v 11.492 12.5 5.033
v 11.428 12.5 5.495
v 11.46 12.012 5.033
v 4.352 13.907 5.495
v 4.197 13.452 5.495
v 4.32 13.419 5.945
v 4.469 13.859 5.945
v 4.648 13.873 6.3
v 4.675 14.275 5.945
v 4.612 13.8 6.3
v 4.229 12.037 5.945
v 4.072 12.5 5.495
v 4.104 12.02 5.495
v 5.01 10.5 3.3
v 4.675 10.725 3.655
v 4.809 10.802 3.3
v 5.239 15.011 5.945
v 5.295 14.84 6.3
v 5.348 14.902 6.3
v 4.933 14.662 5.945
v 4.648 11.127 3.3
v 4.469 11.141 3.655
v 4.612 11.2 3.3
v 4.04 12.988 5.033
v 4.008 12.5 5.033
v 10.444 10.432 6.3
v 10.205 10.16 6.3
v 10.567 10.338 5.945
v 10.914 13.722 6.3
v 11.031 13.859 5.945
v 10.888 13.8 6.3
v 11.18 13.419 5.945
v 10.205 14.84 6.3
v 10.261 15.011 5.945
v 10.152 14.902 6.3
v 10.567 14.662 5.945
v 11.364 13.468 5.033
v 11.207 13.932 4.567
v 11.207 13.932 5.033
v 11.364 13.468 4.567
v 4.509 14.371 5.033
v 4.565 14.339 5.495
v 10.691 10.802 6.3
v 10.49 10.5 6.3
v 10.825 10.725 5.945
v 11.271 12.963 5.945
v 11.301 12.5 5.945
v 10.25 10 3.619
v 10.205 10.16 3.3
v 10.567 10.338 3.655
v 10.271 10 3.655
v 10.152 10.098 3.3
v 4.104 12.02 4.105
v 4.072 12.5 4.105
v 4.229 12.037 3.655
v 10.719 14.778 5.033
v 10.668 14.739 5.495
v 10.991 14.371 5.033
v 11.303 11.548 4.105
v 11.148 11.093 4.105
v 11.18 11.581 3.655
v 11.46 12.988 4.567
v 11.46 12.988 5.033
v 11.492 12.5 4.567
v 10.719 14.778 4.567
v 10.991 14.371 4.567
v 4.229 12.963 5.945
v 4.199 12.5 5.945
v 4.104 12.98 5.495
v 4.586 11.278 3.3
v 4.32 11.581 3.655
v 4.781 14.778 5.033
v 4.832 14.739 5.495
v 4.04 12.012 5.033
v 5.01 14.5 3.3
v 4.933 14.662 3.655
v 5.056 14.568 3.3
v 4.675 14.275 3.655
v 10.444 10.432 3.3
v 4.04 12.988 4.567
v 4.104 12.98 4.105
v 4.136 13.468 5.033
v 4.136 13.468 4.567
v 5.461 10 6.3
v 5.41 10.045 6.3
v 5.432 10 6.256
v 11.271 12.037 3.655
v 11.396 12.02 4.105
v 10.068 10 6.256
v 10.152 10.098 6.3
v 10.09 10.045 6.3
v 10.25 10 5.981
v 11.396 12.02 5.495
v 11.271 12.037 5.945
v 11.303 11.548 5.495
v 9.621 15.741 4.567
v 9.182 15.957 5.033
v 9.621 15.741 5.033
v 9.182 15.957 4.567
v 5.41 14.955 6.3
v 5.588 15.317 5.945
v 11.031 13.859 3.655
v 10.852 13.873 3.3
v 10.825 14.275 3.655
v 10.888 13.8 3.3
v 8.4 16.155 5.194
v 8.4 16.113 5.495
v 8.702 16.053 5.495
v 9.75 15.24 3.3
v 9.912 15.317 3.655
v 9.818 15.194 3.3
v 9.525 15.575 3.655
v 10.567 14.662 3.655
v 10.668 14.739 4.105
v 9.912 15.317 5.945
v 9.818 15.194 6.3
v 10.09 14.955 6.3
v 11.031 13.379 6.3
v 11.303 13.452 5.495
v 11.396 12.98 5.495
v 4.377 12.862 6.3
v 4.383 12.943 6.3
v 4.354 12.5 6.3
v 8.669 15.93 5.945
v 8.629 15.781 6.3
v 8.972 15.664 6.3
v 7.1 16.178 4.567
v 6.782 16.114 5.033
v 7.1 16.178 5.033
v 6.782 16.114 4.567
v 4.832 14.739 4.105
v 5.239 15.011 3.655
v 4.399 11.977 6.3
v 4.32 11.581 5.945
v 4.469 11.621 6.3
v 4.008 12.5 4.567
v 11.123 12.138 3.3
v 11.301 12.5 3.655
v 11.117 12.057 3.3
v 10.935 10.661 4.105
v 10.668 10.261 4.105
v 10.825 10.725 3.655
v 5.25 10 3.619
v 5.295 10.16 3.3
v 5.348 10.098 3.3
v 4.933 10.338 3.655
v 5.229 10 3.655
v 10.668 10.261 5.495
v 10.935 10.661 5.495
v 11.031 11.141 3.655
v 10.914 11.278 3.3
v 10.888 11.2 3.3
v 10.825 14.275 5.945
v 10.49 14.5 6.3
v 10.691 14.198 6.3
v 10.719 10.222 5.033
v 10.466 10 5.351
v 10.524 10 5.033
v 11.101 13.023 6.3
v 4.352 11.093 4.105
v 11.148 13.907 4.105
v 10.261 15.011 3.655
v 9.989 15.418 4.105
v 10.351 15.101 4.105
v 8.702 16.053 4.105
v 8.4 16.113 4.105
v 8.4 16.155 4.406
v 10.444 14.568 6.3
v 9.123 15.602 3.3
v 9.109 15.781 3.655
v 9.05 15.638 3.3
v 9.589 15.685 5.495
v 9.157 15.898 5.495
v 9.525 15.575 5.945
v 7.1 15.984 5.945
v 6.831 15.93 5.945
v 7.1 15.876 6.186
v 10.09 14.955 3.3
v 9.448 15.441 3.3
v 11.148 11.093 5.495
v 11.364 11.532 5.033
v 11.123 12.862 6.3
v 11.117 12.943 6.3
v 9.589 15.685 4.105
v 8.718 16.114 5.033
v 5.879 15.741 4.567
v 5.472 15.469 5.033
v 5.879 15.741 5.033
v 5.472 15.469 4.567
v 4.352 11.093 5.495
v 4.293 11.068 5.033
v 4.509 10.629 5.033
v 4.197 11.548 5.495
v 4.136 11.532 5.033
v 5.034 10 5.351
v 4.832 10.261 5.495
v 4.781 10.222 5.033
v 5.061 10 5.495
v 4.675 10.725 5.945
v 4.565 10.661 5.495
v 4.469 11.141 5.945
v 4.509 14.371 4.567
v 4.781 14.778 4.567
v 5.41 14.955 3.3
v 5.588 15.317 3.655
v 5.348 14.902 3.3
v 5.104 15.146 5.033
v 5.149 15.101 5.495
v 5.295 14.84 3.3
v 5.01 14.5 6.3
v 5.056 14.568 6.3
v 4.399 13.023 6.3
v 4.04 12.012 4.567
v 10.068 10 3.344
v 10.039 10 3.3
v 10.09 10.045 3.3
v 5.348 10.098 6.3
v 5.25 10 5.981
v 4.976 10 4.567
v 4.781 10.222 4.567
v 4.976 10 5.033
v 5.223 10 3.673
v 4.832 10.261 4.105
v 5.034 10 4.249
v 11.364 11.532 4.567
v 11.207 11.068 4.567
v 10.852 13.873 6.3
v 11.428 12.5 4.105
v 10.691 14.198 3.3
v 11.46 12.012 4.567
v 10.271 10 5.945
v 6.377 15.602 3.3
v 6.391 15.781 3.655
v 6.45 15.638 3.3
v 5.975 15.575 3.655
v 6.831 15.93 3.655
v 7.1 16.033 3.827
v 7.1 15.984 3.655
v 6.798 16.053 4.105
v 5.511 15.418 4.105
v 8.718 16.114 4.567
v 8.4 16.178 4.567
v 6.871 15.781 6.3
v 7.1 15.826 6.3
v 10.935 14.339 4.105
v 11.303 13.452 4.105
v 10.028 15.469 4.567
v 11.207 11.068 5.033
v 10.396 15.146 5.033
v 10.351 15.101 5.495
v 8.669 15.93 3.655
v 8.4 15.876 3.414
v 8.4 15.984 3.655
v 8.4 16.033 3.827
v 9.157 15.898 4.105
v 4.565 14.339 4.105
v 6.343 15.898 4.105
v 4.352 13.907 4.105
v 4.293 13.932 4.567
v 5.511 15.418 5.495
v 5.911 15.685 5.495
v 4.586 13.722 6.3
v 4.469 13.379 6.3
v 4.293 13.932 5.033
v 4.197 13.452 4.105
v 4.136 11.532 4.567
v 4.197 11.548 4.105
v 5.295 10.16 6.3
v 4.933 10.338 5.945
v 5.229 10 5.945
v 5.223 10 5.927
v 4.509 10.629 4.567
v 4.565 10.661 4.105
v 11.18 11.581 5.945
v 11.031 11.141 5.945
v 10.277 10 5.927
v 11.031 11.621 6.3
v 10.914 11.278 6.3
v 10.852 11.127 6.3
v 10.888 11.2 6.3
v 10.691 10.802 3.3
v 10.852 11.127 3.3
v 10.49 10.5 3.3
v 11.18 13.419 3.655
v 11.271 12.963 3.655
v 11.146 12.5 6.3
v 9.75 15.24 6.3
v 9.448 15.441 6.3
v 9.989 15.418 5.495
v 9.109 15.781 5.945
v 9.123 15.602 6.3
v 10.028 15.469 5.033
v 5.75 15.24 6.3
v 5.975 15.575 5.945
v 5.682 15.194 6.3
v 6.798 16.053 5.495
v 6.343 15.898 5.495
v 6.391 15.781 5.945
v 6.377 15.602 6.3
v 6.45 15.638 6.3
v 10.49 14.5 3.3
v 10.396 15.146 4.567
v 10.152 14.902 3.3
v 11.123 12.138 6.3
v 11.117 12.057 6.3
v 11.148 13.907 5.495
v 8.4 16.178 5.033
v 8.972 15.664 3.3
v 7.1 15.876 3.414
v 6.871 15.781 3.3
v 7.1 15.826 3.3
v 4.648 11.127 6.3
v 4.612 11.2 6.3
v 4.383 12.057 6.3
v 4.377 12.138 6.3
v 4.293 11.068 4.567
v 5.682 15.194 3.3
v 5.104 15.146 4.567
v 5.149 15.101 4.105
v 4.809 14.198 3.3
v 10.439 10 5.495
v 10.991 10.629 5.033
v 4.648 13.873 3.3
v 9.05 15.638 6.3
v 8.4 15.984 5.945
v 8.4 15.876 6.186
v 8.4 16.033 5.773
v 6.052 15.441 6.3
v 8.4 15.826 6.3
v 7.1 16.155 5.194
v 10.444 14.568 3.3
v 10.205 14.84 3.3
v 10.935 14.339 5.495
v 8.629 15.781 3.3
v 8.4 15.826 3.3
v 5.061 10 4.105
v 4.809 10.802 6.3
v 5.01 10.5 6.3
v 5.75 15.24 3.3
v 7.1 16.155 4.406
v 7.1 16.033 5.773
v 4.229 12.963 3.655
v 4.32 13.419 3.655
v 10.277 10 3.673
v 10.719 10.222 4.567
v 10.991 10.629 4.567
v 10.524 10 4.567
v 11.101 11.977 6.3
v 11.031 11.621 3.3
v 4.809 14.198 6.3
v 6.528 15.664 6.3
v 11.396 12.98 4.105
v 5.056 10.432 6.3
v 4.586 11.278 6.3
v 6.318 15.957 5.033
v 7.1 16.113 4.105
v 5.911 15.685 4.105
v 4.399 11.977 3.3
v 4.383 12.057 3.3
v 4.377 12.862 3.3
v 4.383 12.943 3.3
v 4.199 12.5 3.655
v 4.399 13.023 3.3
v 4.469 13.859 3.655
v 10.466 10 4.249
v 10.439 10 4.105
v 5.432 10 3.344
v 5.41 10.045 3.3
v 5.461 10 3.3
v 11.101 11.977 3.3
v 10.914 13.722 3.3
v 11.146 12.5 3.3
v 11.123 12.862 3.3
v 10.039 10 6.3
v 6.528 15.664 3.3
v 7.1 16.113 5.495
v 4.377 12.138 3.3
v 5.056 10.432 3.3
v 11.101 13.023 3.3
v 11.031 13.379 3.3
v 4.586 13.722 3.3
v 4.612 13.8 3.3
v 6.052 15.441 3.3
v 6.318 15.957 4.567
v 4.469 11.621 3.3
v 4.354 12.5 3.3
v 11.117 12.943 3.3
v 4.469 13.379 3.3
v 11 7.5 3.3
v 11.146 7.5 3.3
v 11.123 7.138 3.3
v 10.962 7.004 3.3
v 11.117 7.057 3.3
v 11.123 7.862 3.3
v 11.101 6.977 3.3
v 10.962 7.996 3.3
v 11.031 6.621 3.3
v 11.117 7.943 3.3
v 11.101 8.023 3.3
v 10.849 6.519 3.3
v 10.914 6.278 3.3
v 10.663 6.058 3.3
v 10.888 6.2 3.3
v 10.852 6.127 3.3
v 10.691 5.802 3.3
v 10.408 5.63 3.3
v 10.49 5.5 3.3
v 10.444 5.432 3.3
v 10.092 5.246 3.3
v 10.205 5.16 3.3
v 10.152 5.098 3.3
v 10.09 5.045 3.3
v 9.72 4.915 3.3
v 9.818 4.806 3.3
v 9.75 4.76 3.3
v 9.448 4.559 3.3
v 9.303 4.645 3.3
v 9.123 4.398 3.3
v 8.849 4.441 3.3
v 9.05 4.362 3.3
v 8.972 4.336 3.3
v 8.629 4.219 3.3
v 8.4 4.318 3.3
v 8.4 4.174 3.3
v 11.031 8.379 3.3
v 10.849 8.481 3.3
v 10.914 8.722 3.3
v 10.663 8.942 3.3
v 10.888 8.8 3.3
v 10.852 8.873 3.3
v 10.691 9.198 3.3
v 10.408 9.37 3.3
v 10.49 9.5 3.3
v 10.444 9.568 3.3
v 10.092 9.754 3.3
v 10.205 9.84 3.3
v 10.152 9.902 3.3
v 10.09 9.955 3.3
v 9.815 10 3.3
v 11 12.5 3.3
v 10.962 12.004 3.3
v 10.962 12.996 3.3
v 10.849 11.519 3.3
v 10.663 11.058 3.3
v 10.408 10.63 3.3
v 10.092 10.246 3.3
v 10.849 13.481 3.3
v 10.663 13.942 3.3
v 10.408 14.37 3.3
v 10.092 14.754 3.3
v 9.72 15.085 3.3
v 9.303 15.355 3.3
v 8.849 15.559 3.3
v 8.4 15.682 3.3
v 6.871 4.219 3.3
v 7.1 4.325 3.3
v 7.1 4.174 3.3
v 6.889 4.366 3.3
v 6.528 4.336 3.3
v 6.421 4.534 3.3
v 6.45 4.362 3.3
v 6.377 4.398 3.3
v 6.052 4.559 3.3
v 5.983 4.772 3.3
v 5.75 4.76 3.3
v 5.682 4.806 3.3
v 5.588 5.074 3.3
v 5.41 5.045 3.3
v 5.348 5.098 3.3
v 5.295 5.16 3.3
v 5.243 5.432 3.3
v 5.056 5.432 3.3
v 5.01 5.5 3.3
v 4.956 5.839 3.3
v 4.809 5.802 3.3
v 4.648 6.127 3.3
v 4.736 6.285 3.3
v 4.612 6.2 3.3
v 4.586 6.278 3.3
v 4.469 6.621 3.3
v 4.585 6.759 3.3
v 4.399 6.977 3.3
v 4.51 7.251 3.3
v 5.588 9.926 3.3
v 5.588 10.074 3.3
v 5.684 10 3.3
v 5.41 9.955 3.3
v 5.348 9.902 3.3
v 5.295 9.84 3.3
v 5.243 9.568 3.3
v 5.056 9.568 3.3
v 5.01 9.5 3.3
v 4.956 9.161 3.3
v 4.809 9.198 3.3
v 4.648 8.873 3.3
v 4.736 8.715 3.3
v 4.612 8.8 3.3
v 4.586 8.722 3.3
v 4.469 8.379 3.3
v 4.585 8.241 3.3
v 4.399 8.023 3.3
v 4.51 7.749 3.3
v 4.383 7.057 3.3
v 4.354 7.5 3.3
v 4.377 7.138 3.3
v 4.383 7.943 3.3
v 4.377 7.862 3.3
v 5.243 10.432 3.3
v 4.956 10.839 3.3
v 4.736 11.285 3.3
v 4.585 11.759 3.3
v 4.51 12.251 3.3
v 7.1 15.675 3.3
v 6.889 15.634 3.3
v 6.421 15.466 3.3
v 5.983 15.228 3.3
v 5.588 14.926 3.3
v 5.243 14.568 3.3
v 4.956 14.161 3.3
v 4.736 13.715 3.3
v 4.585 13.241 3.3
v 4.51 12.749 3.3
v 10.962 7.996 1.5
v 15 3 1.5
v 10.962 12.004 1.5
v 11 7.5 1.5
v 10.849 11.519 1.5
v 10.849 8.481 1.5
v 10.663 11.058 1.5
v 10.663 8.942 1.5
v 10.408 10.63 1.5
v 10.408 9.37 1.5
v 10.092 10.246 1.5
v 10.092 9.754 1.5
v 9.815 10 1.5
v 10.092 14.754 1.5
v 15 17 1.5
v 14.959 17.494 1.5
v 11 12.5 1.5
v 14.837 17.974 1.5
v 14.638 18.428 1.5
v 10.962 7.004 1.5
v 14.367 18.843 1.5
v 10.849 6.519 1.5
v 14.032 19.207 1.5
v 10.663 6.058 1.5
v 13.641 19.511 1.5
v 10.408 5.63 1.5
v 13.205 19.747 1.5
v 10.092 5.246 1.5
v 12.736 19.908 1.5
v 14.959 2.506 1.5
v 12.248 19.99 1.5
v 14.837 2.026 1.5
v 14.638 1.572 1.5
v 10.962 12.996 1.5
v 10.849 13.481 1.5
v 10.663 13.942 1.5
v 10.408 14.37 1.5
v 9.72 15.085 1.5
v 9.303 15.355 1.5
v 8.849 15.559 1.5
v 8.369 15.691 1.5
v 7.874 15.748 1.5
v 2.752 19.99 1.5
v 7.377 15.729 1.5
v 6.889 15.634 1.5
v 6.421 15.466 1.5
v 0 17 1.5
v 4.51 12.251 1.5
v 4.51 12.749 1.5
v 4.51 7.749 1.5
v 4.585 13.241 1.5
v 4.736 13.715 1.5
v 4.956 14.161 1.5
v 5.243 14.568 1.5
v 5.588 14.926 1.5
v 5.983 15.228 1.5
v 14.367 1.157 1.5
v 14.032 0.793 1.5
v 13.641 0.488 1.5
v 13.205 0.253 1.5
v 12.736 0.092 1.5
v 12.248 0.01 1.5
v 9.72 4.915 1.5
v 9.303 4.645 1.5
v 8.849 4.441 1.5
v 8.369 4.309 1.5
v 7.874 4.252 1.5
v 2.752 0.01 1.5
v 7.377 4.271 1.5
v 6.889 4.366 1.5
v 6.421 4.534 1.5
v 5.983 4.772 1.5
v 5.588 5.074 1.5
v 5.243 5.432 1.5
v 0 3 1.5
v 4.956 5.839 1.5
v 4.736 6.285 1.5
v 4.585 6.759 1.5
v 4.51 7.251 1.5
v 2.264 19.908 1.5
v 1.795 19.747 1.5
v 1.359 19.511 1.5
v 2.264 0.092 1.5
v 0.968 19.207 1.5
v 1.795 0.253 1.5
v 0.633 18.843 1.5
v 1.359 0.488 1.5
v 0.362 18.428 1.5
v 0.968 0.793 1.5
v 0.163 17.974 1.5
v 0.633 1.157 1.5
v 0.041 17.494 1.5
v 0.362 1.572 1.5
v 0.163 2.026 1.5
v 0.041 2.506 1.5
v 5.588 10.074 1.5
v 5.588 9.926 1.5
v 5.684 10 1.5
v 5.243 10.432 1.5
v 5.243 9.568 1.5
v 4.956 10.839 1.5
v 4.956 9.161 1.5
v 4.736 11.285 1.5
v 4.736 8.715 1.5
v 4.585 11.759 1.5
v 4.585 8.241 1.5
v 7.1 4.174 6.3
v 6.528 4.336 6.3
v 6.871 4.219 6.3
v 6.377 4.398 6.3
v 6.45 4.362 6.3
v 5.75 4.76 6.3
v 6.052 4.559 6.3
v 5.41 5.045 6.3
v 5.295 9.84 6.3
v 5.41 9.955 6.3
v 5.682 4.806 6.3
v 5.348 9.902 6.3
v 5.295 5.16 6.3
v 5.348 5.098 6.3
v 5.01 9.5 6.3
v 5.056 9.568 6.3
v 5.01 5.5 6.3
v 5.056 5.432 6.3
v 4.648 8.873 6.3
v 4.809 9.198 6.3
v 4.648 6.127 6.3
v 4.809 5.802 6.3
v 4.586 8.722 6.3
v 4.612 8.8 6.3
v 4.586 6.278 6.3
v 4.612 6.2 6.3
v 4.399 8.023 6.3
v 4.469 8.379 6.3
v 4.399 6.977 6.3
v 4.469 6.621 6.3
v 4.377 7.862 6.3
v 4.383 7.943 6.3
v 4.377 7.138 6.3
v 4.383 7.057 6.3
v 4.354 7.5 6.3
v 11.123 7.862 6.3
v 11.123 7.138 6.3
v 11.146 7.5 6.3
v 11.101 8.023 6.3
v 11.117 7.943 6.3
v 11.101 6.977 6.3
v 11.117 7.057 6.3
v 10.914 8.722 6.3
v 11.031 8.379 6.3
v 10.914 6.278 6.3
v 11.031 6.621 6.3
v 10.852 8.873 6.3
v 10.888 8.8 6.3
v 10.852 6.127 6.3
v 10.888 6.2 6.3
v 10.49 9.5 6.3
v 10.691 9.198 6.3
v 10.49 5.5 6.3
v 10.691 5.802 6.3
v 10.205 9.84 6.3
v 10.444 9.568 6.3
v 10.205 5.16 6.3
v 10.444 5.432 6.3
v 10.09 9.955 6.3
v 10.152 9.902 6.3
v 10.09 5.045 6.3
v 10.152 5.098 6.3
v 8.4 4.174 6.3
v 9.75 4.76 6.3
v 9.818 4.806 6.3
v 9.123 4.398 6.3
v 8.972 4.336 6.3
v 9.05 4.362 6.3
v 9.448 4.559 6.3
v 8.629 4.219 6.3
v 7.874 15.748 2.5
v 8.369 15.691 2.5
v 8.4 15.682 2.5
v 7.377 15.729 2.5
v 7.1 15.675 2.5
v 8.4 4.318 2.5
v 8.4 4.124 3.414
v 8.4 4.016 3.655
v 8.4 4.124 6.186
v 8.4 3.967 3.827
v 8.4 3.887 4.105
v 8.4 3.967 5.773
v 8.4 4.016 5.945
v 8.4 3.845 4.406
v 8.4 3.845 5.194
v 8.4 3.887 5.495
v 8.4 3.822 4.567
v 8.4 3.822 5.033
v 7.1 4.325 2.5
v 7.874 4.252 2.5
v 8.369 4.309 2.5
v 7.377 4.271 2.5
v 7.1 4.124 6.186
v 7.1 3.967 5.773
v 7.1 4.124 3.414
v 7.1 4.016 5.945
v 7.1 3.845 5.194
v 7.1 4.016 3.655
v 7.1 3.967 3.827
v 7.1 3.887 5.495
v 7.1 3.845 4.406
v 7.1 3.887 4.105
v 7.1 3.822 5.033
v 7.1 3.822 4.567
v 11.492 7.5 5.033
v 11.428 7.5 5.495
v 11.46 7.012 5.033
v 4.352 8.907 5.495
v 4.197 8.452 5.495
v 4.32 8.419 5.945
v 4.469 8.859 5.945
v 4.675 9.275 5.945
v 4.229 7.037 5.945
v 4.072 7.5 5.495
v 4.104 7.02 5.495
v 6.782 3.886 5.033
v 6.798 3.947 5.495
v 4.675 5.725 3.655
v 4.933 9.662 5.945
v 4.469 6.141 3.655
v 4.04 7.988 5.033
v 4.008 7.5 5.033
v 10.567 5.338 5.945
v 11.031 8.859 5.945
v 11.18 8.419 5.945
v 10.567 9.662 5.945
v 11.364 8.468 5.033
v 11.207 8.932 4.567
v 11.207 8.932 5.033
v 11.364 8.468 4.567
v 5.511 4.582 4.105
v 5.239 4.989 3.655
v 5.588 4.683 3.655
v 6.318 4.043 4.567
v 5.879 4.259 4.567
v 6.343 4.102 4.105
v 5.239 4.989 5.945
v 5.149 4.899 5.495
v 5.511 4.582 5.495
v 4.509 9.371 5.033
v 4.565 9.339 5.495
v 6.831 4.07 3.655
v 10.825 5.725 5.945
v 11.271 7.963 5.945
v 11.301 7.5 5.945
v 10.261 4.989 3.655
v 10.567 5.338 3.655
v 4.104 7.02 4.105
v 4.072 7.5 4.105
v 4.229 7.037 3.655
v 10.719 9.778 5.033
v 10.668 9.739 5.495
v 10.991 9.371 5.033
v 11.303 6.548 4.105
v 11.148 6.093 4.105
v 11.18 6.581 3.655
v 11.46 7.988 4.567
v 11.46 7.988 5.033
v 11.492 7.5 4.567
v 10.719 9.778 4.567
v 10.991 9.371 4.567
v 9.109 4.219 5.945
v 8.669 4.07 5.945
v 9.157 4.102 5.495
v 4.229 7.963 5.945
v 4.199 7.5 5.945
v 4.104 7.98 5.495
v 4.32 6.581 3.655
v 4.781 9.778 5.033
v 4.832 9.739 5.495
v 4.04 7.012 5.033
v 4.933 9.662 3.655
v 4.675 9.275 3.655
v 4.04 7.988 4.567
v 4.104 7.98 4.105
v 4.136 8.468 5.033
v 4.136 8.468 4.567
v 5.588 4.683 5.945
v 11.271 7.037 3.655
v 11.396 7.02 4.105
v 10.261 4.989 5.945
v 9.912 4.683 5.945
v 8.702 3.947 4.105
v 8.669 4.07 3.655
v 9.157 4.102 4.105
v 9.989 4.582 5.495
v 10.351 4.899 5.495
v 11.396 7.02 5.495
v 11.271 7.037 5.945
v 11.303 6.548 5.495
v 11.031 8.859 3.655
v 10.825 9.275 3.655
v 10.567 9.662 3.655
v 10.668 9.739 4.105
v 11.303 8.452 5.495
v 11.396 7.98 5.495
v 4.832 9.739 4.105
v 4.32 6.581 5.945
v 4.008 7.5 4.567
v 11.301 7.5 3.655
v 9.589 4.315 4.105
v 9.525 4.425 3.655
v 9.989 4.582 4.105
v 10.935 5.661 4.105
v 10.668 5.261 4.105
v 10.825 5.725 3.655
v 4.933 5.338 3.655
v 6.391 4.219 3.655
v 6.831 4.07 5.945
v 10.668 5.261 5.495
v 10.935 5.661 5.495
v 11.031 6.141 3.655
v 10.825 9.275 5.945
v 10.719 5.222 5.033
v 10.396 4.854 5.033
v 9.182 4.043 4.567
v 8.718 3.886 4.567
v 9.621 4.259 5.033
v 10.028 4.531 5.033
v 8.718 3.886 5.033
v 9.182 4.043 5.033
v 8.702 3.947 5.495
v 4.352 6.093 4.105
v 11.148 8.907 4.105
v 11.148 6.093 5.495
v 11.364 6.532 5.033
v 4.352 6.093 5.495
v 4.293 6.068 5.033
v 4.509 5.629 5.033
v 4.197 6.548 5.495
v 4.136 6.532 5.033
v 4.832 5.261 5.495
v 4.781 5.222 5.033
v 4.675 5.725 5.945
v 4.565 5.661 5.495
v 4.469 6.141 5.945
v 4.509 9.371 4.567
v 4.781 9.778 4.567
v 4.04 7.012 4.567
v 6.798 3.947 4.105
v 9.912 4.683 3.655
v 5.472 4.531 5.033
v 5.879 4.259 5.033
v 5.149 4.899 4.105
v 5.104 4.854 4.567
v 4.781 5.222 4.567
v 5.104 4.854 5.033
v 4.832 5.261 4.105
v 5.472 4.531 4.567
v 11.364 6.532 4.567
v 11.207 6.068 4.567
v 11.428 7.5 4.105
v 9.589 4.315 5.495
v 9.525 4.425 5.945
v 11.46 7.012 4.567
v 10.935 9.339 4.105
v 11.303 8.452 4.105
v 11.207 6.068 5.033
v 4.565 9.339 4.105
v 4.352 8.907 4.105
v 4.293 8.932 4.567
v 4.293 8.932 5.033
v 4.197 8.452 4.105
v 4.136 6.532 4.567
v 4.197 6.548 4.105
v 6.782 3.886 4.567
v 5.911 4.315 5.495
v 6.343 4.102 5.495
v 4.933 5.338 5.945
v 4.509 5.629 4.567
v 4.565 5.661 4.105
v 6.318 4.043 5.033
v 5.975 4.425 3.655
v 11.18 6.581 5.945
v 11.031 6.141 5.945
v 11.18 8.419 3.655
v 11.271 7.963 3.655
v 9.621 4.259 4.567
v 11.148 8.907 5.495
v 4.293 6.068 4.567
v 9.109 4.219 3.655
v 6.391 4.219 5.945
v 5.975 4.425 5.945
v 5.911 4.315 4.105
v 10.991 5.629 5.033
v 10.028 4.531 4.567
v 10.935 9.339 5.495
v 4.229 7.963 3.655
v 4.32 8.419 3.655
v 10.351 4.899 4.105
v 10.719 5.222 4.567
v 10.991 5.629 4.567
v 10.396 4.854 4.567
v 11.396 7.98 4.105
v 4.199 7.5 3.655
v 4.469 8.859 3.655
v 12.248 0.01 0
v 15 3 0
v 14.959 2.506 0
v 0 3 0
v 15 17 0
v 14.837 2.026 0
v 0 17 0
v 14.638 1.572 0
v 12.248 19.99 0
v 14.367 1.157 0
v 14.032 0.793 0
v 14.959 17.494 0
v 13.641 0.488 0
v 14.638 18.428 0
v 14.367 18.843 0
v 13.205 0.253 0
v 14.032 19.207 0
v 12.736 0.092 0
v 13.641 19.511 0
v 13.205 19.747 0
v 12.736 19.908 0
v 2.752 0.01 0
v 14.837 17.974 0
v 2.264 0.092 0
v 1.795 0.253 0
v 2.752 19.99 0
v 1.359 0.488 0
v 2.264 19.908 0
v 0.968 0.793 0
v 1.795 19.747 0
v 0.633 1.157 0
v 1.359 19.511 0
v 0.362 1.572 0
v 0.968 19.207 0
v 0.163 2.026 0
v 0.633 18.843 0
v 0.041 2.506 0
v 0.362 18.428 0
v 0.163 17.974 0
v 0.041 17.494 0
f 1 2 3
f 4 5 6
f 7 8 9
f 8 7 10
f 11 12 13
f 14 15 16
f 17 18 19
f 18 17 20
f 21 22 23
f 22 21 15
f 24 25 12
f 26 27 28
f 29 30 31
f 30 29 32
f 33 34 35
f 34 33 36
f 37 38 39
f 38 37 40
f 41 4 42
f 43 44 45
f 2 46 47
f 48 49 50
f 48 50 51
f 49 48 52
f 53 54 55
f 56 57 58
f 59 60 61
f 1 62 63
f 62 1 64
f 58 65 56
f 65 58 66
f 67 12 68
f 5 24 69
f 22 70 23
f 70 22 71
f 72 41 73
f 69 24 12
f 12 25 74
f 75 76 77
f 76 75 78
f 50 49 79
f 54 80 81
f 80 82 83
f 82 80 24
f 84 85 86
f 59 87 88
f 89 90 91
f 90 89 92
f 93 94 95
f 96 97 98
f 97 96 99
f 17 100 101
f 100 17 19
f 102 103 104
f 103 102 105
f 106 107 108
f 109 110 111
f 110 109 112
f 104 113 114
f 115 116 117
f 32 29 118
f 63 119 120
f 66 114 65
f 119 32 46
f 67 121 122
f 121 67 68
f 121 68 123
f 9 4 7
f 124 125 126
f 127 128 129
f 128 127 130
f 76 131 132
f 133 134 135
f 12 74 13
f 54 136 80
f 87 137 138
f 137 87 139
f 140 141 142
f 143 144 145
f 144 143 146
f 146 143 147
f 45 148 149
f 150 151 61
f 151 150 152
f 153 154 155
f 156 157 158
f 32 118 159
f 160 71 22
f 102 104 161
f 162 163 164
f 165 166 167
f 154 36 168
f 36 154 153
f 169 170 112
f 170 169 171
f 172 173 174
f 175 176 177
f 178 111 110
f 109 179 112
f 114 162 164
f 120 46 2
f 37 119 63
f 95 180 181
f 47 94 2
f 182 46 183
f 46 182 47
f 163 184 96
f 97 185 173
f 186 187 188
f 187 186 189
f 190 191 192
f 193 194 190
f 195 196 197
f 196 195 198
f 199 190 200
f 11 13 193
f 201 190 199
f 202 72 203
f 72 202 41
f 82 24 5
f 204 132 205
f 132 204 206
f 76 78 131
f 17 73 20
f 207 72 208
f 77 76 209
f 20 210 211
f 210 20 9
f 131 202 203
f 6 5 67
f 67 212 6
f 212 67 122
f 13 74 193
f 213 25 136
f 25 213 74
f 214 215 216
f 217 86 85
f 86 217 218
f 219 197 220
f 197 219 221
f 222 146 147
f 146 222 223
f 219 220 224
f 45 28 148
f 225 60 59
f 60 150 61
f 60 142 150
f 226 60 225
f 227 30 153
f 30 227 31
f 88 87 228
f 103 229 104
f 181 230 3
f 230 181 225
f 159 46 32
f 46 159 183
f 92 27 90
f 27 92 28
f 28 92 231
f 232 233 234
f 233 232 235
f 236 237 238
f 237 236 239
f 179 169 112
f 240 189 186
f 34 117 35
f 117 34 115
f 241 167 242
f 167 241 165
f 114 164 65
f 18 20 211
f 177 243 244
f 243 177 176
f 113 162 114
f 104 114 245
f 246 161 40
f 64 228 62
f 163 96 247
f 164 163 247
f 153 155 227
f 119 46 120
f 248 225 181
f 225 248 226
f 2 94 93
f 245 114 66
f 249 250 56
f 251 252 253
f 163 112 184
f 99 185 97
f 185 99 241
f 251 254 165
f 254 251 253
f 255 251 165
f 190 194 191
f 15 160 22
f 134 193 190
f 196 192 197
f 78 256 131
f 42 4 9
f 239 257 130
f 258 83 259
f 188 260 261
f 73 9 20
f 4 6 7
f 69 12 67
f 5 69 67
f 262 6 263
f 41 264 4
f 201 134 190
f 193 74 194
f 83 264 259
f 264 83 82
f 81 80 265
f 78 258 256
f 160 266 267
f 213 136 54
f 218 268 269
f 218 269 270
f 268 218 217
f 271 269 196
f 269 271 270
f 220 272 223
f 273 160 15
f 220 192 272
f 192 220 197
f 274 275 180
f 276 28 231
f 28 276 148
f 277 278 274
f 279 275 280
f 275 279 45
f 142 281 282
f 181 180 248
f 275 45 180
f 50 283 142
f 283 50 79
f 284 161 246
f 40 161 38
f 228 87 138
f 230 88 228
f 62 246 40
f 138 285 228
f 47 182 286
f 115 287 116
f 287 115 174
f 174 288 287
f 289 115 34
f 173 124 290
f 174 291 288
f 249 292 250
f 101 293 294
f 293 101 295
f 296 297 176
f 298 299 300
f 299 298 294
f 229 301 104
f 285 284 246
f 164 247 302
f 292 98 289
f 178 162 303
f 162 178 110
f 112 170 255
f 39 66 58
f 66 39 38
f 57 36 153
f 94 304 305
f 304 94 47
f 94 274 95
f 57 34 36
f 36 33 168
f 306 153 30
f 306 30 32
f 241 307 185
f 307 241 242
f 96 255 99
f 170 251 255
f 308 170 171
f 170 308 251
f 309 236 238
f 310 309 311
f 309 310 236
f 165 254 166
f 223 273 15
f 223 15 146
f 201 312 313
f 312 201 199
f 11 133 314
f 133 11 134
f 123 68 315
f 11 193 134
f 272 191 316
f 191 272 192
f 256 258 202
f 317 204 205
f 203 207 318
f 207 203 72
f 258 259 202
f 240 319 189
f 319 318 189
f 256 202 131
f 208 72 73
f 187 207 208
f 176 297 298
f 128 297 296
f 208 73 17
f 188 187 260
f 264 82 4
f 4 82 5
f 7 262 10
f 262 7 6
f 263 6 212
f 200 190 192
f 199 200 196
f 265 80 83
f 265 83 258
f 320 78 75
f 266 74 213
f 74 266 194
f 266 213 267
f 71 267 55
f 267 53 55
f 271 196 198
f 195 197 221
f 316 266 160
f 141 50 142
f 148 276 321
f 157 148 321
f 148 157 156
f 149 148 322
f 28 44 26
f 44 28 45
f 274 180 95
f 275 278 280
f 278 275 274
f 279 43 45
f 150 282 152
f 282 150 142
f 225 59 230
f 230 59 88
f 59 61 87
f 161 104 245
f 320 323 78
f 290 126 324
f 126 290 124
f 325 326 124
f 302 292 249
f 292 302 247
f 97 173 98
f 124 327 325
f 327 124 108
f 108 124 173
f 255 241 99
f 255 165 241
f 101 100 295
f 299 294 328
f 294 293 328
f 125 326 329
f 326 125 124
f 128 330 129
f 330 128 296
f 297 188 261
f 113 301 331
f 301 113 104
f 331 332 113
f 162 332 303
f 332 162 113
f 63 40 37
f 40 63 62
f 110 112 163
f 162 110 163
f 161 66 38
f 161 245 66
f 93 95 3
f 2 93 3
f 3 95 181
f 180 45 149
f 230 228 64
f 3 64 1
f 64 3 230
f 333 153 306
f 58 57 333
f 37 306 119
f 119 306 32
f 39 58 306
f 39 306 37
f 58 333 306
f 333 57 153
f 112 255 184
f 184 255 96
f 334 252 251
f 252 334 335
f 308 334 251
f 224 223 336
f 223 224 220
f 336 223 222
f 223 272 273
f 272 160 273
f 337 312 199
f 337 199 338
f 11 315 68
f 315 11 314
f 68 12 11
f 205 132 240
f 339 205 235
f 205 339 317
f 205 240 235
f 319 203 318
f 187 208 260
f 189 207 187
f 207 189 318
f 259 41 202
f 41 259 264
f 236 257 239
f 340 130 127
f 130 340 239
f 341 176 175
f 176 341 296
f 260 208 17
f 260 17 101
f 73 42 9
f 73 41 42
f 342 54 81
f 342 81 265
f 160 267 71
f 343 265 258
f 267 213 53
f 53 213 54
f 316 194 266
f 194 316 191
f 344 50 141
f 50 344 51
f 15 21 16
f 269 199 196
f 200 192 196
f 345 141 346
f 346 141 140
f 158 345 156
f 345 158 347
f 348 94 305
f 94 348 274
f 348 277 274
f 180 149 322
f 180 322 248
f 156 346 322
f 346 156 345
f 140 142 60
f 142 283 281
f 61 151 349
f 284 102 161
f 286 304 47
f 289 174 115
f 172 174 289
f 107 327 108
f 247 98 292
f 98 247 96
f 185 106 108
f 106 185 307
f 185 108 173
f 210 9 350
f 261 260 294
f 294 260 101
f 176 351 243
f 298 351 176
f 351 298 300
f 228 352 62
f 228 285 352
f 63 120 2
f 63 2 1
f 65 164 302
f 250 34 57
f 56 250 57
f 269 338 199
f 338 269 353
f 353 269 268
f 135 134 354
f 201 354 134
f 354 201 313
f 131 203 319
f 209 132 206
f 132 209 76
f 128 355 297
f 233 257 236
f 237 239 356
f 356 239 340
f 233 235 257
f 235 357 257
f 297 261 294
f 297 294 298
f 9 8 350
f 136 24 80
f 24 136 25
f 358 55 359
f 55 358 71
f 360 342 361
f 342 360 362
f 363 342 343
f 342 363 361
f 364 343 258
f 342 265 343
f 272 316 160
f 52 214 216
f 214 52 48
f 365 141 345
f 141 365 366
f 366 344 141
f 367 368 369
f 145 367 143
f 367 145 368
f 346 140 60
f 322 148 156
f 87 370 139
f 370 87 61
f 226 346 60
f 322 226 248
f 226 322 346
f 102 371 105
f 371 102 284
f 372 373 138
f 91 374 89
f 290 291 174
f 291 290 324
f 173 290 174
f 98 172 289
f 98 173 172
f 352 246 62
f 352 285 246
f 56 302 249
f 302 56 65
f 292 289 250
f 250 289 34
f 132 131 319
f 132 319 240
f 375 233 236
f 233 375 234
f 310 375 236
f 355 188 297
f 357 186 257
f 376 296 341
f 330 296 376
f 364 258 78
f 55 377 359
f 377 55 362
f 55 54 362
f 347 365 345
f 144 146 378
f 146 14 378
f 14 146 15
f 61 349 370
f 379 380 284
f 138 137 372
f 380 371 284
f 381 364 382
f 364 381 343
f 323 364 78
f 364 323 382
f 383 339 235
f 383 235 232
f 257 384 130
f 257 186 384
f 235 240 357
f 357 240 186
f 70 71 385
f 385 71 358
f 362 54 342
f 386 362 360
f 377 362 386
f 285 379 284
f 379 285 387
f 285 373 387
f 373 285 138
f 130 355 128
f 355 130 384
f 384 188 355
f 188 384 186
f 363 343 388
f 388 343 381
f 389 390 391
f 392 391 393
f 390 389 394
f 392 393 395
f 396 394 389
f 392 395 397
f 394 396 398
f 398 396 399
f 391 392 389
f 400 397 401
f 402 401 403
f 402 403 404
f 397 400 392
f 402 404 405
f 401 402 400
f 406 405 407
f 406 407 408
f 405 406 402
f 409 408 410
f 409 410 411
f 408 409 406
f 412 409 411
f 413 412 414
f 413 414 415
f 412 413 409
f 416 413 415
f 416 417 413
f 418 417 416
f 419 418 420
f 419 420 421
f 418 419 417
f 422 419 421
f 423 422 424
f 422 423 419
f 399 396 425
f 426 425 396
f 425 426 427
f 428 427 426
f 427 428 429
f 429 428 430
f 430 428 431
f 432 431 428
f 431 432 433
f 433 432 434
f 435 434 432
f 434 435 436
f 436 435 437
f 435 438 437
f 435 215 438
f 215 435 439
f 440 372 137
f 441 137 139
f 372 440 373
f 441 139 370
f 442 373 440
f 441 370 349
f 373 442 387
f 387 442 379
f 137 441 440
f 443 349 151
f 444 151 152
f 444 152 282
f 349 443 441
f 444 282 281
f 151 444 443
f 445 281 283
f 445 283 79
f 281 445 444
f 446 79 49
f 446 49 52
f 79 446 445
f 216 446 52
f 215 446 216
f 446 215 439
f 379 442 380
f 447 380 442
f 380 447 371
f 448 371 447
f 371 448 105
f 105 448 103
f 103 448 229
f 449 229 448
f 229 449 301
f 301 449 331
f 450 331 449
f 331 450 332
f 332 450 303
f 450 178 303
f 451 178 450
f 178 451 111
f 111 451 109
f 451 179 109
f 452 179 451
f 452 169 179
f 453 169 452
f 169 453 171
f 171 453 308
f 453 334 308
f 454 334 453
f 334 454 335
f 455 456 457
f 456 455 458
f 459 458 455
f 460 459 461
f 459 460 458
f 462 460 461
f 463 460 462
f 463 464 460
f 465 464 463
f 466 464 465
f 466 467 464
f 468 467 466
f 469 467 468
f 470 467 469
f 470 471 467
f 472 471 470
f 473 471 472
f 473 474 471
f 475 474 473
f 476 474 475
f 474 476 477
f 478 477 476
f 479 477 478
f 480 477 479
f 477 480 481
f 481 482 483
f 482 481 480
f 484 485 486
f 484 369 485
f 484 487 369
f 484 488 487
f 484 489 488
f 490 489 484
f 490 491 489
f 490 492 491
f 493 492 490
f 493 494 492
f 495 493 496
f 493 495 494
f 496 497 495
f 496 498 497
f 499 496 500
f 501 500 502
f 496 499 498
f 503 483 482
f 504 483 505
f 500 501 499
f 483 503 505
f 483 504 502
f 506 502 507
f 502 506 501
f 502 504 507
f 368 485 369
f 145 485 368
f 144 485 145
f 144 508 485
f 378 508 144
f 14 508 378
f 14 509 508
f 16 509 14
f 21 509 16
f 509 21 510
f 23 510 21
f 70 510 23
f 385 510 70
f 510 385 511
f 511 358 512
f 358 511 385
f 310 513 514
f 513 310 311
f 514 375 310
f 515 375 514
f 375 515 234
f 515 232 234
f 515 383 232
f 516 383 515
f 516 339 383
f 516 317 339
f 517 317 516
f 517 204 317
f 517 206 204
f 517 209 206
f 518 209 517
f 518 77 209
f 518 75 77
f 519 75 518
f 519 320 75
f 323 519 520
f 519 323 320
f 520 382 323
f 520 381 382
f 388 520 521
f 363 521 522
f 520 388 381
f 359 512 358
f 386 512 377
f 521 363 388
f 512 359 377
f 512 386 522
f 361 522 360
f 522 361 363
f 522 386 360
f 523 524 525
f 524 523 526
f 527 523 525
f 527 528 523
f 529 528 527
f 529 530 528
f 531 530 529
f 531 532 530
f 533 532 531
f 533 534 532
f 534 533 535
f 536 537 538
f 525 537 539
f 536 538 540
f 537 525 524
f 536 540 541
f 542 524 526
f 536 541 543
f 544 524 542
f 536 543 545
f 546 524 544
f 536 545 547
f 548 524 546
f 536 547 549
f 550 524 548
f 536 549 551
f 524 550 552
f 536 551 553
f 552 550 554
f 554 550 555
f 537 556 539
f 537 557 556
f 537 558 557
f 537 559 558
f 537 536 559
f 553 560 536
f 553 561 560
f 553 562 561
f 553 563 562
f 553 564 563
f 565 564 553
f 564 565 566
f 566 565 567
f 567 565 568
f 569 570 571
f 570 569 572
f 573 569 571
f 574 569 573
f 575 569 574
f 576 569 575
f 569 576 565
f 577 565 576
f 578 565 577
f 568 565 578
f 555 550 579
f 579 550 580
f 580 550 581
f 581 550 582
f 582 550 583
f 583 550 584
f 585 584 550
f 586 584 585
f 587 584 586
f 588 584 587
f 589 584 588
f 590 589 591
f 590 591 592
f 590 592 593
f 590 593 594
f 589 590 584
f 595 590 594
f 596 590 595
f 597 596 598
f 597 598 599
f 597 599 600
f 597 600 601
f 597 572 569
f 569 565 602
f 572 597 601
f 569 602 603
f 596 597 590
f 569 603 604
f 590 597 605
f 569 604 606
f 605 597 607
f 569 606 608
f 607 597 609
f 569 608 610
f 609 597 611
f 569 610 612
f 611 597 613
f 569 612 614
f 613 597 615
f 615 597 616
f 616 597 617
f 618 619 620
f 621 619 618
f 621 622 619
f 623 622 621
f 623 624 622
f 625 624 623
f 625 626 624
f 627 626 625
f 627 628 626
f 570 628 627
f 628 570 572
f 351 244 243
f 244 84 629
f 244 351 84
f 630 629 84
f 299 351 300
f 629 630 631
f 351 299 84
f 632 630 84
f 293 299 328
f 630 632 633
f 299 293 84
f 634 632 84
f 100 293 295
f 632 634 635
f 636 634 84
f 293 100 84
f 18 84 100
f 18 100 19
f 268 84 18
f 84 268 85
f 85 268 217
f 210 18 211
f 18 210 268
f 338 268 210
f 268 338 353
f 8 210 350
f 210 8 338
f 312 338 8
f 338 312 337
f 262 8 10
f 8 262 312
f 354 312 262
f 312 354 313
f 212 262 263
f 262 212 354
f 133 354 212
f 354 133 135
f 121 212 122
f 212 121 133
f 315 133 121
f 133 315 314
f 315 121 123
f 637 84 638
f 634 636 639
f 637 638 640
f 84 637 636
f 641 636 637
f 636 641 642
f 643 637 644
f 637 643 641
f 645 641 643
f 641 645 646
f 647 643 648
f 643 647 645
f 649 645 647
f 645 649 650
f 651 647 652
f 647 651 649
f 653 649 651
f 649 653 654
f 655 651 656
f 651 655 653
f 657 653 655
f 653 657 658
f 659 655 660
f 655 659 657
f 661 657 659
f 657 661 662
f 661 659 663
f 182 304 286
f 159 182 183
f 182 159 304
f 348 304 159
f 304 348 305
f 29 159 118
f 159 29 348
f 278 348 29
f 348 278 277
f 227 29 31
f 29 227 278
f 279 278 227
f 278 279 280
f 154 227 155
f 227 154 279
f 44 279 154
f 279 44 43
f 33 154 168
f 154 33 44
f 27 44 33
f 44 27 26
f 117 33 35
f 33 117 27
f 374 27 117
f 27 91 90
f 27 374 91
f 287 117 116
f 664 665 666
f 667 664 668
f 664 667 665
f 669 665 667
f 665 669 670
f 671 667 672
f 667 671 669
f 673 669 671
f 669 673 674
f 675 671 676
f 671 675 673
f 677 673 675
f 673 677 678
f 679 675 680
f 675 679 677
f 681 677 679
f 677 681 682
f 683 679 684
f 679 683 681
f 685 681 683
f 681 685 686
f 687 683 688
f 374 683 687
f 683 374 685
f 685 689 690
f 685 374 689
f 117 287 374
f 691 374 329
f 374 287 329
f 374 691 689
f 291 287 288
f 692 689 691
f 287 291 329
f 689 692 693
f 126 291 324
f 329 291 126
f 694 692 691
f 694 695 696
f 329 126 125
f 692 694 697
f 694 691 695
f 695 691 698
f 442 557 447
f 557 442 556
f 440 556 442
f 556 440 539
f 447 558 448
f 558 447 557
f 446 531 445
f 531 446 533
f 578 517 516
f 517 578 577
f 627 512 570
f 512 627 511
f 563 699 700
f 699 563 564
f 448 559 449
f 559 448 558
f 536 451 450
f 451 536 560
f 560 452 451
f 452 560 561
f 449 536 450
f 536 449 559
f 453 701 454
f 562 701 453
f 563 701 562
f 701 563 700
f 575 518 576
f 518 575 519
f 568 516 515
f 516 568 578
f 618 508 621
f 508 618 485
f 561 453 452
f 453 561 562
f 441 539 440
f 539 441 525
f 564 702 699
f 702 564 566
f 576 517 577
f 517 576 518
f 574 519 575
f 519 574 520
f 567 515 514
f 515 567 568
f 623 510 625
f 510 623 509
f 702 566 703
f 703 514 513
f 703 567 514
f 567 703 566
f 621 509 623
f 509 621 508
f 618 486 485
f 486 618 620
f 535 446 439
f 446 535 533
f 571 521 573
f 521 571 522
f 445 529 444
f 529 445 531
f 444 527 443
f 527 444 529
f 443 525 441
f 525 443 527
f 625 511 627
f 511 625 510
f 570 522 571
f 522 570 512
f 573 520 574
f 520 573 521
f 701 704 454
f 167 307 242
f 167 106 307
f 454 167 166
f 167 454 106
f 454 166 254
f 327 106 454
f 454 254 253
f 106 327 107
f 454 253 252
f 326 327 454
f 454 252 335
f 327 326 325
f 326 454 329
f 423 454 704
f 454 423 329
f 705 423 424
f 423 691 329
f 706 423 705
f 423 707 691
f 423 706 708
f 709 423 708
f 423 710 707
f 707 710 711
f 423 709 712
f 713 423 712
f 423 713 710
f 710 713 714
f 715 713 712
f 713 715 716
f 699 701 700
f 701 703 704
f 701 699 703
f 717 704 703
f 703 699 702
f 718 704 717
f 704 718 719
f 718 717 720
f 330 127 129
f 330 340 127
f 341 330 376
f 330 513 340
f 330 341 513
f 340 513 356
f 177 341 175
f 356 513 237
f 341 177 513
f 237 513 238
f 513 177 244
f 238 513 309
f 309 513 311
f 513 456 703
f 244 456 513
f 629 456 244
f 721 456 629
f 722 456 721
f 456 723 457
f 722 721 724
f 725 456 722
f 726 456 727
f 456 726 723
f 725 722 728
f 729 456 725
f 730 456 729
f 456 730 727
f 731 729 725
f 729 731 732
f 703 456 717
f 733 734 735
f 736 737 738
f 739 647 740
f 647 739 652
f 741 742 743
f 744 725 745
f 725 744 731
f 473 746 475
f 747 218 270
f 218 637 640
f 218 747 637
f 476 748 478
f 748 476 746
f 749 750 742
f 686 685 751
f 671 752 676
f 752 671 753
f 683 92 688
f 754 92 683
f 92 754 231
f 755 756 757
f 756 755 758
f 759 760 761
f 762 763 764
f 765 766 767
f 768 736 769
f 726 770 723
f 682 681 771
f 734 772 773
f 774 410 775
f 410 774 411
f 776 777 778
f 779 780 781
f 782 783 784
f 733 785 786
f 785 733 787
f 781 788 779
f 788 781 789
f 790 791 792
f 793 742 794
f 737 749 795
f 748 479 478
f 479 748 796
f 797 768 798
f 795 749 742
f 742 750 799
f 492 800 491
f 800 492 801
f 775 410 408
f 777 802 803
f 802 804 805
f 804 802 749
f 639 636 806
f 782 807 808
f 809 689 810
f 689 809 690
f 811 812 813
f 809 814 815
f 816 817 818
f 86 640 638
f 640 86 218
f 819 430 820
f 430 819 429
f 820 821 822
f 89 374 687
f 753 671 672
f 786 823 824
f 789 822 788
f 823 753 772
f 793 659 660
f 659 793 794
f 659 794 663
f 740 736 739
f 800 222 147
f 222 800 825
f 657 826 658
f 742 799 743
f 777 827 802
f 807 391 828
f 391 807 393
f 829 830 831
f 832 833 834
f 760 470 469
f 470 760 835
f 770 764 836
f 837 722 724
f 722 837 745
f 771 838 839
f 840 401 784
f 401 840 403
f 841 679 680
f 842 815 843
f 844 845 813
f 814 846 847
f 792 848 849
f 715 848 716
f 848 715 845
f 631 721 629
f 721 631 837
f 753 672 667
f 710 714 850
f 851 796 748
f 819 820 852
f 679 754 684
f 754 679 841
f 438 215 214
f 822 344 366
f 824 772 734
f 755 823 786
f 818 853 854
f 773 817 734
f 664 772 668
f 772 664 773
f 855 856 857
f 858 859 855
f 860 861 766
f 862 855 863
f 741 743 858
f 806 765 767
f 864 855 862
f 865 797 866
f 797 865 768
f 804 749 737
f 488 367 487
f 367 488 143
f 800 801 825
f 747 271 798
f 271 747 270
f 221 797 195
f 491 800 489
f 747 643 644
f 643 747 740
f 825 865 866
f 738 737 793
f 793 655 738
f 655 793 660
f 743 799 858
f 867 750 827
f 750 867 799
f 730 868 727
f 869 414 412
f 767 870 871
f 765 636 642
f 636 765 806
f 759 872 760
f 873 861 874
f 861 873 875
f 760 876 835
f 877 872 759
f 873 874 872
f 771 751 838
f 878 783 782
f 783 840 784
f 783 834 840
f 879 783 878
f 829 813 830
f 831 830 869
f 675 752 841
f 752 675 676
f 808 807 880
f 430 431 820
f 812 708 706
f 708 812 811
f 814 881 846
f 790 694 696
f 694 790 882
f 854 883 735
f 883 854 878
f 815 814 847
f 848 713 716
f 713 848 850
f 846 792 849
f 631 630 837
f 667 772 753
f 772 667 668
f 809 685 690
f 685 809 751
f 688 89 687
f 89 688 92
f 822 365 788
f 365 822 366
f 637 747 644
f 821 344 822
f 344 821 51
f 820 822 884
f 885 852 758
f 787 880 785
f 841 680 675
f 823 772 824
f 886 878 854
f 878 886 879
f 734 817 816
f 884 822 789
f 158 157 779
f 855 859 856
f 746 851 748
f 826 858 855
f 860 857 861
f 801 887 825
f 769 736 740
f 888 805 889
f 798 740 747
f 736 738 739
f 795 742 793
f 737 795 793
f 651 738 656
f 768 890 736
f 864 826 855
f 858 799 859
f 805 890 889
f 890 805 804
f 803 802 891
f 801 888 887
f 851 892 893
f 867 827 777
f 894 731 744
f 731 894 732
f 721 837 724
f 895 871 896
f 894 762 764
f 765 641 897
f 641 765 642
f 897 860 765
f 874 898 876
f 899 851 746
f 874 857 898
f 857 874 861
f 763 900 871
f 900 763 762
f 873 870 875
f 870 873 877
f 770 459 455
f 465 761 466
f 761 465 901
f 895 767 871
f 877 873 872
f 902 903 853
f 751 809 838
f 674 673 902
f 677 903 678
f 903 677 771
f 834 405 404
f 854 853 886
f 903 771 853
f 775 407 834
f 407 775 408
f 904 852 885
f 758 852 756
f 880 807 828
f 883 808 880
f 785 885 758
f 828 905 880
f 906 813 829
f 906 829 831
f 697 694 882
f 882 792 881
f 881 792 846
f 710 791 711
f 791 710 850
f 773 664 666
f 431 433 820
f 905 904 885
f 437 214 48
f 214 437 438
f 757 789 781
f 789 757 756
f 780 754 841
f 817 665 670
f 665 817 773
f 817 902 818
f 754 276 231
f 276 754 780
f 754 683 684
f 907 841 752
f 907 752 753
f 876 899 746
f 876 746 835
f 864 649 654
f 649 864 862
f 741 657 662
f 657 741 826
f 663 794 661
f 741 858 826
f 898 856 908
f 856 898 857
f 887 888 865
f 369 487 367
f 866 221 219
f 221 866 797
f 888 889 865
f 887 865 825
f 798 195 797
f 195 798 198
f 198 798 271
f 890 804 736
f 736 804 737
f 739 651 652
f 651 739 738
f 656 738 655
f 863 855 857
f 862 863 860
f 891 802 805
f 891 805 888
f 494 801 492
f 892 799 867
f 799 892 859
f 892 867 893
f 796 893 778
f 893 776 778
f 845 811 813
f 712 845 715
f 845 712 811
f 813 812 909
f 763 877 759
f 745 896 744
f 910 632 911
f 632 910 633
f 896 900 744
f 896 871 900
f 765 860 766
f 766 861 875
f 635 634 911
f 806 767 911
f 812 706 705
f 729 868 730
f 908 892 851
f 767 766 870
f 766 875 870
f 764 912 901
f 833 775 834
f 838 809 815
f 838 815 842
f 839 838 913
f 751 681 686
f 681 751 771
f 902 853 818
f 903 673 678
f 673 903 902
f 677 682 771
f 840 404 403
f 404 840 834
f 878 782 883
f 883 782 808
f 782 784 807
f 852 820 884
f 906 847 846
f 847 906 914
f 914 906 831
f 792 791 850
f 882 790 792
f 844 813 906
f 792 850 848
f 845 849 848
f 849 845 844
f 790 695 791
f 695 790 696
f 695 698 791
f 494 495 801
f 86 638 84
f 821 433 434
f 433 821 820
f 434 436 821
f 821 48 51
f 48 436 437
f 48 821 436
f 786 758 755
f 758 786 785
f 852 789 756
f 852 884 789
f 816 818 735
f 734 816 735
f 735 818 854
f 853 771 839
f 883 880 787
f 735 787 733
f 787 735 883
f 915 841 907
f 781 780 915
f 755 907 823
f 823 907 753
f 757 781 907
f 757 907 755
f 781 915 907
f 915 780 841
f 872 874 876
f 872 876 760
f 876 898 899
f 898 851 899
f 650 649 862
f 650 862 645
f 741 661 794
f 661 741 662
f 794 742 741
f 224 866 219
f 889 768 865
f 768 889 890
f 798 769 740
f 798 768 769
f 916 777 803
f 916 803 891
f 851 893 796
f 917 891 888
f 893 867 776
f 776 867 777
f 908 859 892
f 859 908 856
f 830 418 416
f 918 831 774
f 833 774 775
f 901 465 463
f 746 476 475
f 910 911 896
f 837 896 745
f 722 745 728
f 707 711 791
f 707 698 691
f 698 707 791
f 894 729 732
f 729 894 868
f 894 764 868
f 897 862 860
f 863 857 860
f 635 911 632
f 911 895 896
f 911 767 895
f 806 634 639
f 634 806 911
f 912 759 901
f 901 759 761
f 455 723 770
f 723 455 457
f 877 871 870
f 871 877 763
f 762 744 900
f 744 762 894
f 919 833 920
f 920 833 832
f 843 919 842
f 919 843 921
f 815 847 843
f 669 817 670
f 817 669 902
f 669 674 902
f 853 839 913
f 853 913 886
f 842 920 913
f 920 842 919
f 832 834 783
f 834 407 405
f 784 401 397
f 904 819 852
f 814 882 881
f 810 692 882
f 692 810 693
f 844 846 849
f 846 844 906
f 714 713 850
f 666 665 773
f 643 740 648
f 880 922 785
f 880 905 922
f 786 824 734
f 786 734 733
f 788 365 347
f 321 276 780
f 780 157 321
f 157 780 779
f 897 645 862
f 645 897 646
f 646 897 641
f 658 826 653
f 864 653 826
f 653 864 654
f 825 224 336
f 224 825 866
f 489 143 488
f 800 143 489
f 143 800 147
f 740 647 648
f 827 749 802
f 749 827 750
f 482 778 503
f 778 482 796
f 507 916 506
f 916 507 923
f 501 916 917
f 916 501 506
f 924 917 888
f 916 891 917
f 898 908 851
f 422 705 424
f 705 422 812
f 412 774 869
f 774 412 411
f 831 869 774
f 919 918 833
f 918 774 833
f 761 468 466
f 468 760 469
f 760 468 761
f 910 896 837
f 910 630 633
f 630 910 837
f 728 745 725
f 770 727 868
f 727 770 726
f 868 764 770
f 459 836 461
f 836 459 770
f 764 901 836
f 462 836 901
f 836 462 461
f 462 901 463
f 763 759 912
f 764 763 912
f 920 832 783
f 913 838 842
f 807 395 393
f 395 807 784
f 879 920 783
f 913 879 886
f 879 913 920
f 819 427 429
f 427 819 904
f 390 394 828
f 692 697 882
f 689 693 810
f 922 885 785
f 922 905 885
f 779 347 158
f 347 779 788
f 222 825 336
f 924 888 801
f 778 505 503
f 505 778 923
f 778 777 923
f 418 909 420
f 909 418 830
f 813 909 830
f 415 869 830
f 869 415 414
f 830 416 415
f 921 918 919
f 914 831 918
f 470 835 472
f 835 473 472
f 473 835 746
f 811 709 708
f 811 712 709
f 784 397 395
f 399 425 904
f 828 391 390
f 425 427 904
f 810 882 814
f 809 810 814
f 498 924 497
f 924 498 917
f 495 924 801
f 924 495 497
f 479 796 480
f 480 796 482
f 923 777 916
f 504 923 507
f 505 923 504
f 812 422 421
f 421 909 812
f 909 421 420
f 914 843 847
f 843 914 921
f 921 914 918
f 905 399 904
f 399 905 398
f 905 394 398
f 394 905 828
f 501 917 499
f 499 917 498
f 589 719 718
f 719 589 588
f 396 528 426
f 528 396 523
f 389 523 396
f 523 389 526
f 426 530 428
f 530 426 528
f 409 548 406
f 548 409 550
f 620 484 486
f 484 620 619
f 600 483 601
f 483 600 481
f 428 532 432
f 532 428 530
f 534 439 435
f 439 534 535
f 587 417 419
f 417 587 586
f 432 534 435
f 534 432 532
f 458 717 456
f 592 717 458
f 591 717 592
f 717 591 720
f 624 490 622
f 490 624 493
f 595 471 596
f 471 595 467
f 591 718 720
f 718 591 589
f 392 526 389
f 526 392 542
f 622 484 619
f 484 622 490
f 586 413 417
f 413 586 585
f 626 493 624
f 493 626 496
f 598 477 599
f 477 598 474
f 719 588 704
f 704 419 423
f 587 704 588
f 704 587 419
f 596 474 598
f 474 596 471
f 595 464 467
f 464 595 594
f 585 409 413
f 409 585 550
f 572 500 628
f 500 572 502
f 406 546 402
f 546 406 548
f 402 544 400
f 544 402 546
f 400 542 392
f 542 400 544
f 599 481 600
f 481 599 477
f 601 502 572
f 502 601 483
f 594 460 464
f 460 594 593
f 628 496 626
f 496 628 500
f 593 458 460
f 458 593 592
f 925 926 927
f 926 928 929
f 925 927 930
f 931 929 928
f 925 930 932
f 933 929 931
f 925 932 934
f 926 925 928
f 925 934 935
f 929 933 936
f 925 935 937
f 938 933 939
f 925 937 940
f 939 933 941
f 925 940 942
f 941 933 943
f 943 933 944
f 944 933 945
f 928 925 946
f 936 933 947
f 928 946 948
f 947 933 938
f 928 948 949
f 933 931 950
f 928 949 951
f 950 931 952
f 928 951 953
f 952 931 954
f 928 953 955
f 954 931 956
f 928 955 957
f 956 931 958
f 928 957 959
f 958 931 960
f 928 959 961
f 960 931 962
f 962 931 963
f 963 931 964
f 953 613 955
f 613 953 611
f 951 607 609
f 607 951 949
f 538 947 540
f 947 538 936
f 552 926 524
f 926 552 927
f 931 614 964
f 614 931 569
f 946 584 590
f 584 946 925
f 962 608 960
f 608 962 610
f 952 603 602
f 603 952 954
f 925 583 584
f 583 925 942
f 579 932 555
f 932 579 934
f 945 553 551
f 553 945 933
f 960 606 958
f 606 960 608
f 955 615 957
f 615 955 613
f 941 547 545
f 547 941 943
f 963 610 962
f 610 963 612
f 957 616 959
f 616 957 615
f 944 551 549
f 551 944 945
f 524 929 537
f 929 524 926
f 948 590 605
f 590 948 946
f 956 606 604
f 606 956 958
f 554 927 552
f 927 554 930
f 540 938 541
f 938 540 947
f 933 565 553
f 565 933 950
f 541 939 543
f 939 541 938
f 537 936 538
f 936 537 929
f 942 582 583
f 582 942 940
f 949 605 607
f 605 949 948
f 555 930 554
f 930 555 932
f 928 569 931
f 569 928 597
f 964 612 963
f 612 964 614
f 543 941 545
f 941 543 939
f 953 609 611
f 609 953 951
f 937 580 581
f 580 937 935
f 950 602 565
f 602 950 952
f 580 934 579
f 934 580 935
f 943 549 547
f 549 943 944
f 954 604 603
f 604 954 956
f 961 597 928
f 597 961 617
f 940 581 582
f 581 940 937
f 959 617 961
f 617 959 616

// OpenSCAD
/**
Make 6 drawers that run the full drawer depth.
Assorted packs of resistors ordered from Amazon typically come in 30 denominations, so 5 drawers with 6 compartments is perfect for my needs

- costmo
- 2018-04-04
**/

// The surface dimensions of the cap
// The width of the cap (the edge that runs along the rail - if you want to entirely cover the wire path, make this the length of the run to cover)
capWidth = 20;
// The height of the cap (make this the rail's height or less) 
capHeight = 15;
// Width of the gap/space in the rail (the gap where your V-nuts/T-nuts slide into the rail, or a little smaller)
railGap = 6.5;
// How deep into the gap do we need to go to "catch." Make this tight to avoid adding a source of vibration.
gapReach = 1.8;
// When multiple insertion tabs are created, how far from the edge are the outer ones
multiTabInset = 6;

// The "catch" in the inertion tab is a ball. What is its diameter.
insertionCatchDiameter = 7.5;
// The height of the insertion catch ball. Leave enough room for wires to pass!
insertionCatchHeight = 3;

// How round to make the corners
cornerDiameter = 6;

// How thick to make the wall/cap
wallThickness = 1.5;

// How tall to make the post that snaps into the gap
gapPostHeight = gapReach;


// Rendering variables
// Minimum angle -- use for final rendering. Comment for preview.
$fa = 4; 
// Minimum size -- use for final rendering. Comment for preview.
$fs = 0.5; 

/* Calculated variables (these don't show in the Customizer) */
capDepth = wallThickness; // The depth of the cap

// adjust for corners
adjustedCapWidth = capWidth - cornerDiameter;
adjustedCapHeight = capHeight - cornerDiameter;

// The radius if the post to make in the rail gap for an insertion tab
gapPostDiameter = railGap;
// How wide to make the split in the insertion tab post
gapPostSplit = railGap * 0.2;


wireCover();

// The base unit that joins the pieces together
module wireCover()
{
    coverPlate();
    gapPosts();
}

// Make all of the insertion posts, based on the width of the piece.
// Break points are:
// Between 0 and 34   = 1 post
// Between 30 and 99 = 2 posts
// Everything larger  = 3 posts
module gapPosts()
{
    if( capWidth < 20 )
    {
        translate( [(adjustedCapHeight/2) + (gapPostDiameter/2), (adjustedCapWidth/2) + (gapPostDiameter/2), capDepth] )
        {
            gapPost();
        }
    }
    else if( capWidth < 100 )
    {
        translate( [(adjustedCapHeight/2) + (gapPostDiameter/2), (railGap + multiTabInset), capDepth] )
        {
            gapPost();
        }
        translate( [(adjustedCapHeight/2) + (gapPostDiameter/2), (capWidth - (railGap + multiTabInset)), capDepth] )
        {
            gapPost();
        }
    }
    else
    {
        translate( [(adjustedCapHeight/2) + (gapPostDiameter/2), (railGap + multiTabInset), capDepth] )
        {
            gapPost();
        }
        translate( [(adjustedCapHeight/2) + (gapPostDiameter/2), (adjustedCapWidth/2) + (gapPostDiameter/2), capDepth] )
        {
            gapPost();
        }
        translate( [(adjustedCapHeight/2) + (gapPostDiameter/2), (capWidth - (railGap + multiTabInset)), capDepth] )
        {
            gapPost();
        }
    }
}

// Make a single post
module gapPost()
{
    difference()
    {
        { // make a main body
            union()
            {
                {
                    // shaft
                    cylinder( d = gapPostDiameter, h = gapPostHeight );
                }
                {
                    difference()
                    {
                        {
                            
                            {
                                // ball at the top for tension
                                translate( [0, 0, (gapPostHeight + (insertionCatchHeight/2))] )
                                {
                                    scale( v = [1, 1, 0.95] )
                                    {
                                        sphere( d = insertionCatchDiameter );
                                    }
                                }
                            }
                        }
                        
                        { // remove the top and bottom of the ball at the set height
                            translate( [(-1 * (capHeight/2)), (-1 * (capWidth/2)), 0] )
                            {
                                cube( [capHeight, capWidth, gapPostHeight] );
                            }
                        }
                        {
                            translate( [(-1 * (capHeight/2)), (-1 * (capWidth/2)), gapPostHeight + insertionCatchHeight] )
                            {
                                cube( [capHeight, capWidth, gapPostHeight + 20] );
                            }
                        }
                        
                    }
                }
            }
        }
        { // Now remove a slice from the middle so the posts can squeeze together a little bit
            translate( [(-0.5 * gapPostSplit), (-0.5 * capWidth), 1] )
            {
                cube( [gapPostSplit, capWidth, 50] );
            }
        }
    }      
}

// Make the cover plate
module coverPlate()
{
    hull()
    {
        {
            translate( [(cornerDiameter/2), (cornerDiameter/2), 0] )
            {
                cube( [adjustedCapHeight, adjustedCapWidth, capDepth] );
            }
        }
        {
            coverPlateCorners();
        }
    }
            
}

// Convenience to add corners to the cover plate for hulling
module coverPlateCorners()
{
    translate( [(cornerDiameter/2), (cornerDiameter/2), 0] )
    {
        cylinder( d = cornerDiameter, h = capDepth );
    }
    
    translate( [(cornerDiameter/2) + adjustedCapHeight, (cornerDiameter/2), 0] )
    {
        cylinder( d = cornerDiameter, h = capDepth );
    }
    
    translate( [(cornerDiameter/2), (cornerDiameter/2) + adjustedCapWidth, 0] )
    {
        cylinder( d = cornerDiameter, h = capDepth );
    }
    
    translate( [(cornerDiameter/2) + adjustedCapHeight, (cornerDiameter/2) + adjustedCapWidth, 0] )
    {
        cylinder( d = cornerDiameter, h = capDepth );
    }
}
